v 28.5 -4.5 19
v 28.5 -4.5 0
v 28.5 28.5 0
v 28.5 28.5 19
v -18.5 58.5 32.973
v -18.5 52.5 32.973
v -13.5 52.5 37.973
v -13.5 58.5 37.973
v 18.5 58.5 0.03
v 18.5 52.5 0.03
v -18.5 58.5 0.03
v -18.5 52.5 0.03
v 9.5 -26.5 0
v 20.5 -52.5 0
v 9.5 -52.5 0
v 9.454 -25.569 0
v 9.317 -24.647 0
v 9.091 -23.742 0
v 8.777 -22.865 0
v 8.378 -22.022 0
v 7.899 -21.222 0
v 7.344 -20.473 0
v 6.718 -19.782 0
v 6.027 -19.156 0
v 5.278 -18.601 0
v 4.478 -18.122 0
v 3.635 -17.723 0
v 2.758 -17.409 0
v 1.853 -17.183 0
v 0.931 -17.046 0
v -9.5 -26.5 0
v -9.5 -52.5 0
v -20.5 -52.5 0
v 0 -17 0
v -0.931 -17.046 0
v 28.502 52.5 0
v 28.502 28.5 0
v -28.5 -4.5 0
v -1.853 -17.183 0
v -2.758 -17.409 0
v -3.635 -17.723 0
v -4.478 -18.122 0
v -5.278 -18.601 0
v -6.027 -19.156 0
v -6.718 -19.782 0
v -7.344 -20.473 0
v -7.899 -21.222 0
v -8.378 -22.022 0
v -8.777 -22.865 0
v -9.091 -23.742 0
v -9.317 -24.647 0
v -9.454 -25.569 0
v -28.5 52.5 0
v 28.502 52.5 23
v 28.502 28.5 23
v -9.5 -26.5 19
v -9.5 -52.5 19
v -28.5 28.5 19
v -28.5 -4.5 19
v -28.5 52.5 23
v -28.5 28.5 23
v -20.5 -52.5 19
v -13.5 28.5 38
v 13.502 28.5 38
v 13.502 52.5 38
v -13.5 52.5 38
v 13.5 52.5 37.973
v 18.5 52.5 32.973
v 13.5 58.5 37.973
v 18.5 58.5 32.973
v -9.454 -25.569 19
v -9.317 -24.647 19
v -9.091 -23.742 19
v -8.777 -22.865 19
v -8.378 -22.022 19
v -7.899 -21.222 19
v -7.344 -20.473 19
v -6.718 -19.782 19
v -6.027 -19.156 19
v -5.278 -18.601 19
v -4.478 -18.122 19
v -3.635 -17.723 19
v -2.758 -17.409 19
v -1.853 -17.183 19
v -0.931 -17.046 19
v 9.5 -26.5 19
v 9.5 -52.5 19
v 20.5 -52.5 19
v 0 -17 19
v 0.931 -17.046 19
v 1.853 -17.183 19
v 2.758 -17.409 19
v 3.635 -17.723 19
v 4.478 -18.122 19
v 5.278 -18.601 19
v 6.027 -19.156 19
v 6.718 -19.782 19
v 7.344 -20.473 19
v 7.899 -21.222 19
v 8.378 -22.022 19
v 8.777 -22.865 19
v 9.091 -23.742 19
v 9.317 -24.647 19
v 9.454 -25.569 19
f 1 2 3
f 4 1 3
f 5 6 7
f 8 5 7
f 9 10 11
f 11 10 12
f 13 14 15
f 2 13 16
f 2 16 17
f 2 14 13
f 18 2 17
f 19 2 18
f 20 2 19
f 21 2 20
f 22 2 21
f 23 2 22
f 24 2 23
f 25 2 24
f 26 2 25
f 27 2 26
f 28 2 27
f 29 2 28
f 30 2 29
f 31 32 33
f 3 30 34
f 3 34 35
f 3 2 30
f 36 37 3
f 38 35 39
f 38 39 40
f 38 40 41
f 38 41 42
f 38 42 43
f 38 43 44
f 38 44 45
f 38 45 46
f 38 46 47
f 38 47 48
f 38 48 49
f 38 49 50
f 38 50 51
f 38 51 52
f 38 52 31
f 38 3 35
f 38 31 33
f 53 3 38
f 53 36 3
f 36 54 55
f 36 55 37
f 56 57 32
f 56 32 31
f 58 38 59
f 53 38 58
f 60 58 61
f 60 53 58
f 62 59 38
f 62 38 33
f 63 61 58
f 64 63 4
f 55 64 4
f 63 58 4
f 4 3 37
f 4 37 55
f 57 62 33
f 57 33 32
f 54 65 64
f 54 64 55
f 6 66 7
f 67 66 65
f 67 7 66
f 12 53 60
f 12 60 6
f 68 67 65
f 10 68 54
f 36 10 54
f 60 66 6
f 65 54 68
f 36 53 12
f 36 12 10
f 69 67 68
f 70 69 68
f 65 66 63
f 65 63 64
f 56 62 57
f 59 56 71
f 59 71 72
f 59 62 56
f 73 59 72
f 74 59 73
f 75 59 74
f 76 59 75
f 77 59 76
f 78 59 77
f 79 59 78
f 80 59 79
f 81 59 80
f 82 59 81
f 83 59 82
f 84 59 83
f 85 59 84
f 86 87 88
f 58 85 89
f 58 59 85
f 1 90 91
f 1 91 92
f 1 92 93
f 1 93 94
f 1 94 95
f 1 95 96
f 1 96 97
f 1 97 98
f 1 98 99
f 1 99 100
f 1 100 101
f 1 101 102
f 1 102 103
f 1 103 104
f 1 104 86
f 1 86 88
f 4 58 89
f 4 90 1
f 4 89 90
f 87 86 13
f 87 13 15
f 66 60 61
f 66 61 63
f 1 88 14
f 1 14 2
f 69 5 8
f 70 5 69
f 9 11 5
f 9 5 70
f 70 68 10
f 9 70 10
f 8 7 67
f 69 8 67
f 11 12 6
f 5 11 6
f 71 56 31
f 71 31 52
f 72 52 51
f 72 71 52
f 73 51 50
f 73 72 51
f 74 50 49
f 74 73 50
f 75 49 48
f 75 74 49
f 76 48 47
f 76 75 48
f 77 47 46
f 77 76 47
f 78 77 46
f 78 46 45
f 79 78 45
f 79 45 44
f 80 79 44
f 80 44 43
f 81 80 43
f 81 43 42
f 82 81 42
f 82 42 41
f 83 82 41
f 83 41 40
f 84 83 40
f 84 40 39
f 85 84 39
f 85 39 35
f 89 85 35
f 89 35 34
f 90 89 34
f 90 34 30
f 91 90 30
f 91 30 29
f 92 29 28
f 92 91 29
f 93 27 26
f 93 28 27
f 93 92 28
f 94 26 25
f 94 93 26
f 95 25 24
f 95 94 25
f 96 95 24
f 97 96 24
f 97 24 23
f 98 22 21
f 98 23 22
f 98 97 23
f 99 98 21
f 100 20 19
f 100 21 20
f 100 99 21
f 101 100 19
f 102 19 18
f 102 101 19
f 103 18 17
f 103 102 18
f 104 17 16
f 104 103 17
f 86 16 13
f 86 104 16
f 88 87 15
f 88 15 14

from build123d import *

# Parameters (mm, degrees)
SKETCH2_W           = 57
SKETCH2_H           = 105
BOSS_EXTRUDE1_DEPTH = 19
CUT_EXTRUDE1_DEPTH  = 19
CUT_EXTRUDE2_DEPTH  = 19
CUT_EXTRUDE3_DEPTH  = 63.685724053
BOSS_EXTRUDE2_DEPTH = 24
BOSS_EXTRUDE3_DEPTH = 6


with BuildPart() as part:
    # Sketch2 → Boss-Extrude1 (new body)
    with BuildSketch(Plane.XY):
        Rectangle(SKETCH2_W, SKETCH2_H)
    extrude(amount=BOSS_EXTRUDE1_DEPTH)

    # Sketch5 → Cut-Extrude1 (cut)
    with BuildSketch(Plane.XY.offset(19)):
        Polygon((28.5, -52.5), (20.5, -52.5), (28.5, -4.5), align=None)
    extrude(amount=-CUT_EXTRUDE1_DEPTH, mode=Mode.SUBTRACT)

    # Sketch6 → Cut-Extrude2 (cut)
    with BuildSketch(Plane.XY.offset(19)):
        Polygon((-28.5, -52.5), (-28.5, -4.5), (-20.5, -52.5), align=None)
    extrude(amount=-CUT_EXTRUDE2_DEPTH, mode=Mode.SUBTRACT)

    # Sketch7 → Cut-Extrude3 (cut, through all)
    with BuildSketch(Plane.XY.offset(19)):
        with BuildLine():
            Line((-9.5, -52.5), (-9.5, -26.5))
            ThreePointArc((-9.5, -26.5), (0, -17), (9.5, -26.5))
            Line((9.5, -26.5), (9.5, -52.5))
            Line((9.5, -52.5), (-9.5, -52.5))
        make_face()
    extrude(amount=-CUT_EXTRUDE3_DEPTH, mode=Mode.SUBTRACT)

    # Sketch9 → Boss-Extrude2 (add)
    with BuildSketch(Plane(origin=(0, 52.5, 0), x_dir=(1, 0, 0), z_dir=(0, 1, 0))):
        Polygon((-28.5, -23), (-13.5, -38), (13.501670398, -38), (28.501670398, -23), (28.501670398, 0), (-28.5, 0), align=None)
    extrude(amount=-BOSS_EXTRUDE2_DEPTH)

    # Sketch10 → Boss-Extrude3 (add)
    with BuildSketch(Plane(origin=(0, 52.5, 0), x_dir=(1, 0, 0), z_dir=(0, 1, 0))):
        Polygon((18.5, -0.029901303), (-18.5, -0.029901303), (-18.5, -32.973175132), (-13.5, -37.973175132), (13.5, -37.973175132), (18.5, -32.973175132), align=None)
    extrude(amount=BOSS_EXTRUDE3_DEPTH)


solid = part.part
